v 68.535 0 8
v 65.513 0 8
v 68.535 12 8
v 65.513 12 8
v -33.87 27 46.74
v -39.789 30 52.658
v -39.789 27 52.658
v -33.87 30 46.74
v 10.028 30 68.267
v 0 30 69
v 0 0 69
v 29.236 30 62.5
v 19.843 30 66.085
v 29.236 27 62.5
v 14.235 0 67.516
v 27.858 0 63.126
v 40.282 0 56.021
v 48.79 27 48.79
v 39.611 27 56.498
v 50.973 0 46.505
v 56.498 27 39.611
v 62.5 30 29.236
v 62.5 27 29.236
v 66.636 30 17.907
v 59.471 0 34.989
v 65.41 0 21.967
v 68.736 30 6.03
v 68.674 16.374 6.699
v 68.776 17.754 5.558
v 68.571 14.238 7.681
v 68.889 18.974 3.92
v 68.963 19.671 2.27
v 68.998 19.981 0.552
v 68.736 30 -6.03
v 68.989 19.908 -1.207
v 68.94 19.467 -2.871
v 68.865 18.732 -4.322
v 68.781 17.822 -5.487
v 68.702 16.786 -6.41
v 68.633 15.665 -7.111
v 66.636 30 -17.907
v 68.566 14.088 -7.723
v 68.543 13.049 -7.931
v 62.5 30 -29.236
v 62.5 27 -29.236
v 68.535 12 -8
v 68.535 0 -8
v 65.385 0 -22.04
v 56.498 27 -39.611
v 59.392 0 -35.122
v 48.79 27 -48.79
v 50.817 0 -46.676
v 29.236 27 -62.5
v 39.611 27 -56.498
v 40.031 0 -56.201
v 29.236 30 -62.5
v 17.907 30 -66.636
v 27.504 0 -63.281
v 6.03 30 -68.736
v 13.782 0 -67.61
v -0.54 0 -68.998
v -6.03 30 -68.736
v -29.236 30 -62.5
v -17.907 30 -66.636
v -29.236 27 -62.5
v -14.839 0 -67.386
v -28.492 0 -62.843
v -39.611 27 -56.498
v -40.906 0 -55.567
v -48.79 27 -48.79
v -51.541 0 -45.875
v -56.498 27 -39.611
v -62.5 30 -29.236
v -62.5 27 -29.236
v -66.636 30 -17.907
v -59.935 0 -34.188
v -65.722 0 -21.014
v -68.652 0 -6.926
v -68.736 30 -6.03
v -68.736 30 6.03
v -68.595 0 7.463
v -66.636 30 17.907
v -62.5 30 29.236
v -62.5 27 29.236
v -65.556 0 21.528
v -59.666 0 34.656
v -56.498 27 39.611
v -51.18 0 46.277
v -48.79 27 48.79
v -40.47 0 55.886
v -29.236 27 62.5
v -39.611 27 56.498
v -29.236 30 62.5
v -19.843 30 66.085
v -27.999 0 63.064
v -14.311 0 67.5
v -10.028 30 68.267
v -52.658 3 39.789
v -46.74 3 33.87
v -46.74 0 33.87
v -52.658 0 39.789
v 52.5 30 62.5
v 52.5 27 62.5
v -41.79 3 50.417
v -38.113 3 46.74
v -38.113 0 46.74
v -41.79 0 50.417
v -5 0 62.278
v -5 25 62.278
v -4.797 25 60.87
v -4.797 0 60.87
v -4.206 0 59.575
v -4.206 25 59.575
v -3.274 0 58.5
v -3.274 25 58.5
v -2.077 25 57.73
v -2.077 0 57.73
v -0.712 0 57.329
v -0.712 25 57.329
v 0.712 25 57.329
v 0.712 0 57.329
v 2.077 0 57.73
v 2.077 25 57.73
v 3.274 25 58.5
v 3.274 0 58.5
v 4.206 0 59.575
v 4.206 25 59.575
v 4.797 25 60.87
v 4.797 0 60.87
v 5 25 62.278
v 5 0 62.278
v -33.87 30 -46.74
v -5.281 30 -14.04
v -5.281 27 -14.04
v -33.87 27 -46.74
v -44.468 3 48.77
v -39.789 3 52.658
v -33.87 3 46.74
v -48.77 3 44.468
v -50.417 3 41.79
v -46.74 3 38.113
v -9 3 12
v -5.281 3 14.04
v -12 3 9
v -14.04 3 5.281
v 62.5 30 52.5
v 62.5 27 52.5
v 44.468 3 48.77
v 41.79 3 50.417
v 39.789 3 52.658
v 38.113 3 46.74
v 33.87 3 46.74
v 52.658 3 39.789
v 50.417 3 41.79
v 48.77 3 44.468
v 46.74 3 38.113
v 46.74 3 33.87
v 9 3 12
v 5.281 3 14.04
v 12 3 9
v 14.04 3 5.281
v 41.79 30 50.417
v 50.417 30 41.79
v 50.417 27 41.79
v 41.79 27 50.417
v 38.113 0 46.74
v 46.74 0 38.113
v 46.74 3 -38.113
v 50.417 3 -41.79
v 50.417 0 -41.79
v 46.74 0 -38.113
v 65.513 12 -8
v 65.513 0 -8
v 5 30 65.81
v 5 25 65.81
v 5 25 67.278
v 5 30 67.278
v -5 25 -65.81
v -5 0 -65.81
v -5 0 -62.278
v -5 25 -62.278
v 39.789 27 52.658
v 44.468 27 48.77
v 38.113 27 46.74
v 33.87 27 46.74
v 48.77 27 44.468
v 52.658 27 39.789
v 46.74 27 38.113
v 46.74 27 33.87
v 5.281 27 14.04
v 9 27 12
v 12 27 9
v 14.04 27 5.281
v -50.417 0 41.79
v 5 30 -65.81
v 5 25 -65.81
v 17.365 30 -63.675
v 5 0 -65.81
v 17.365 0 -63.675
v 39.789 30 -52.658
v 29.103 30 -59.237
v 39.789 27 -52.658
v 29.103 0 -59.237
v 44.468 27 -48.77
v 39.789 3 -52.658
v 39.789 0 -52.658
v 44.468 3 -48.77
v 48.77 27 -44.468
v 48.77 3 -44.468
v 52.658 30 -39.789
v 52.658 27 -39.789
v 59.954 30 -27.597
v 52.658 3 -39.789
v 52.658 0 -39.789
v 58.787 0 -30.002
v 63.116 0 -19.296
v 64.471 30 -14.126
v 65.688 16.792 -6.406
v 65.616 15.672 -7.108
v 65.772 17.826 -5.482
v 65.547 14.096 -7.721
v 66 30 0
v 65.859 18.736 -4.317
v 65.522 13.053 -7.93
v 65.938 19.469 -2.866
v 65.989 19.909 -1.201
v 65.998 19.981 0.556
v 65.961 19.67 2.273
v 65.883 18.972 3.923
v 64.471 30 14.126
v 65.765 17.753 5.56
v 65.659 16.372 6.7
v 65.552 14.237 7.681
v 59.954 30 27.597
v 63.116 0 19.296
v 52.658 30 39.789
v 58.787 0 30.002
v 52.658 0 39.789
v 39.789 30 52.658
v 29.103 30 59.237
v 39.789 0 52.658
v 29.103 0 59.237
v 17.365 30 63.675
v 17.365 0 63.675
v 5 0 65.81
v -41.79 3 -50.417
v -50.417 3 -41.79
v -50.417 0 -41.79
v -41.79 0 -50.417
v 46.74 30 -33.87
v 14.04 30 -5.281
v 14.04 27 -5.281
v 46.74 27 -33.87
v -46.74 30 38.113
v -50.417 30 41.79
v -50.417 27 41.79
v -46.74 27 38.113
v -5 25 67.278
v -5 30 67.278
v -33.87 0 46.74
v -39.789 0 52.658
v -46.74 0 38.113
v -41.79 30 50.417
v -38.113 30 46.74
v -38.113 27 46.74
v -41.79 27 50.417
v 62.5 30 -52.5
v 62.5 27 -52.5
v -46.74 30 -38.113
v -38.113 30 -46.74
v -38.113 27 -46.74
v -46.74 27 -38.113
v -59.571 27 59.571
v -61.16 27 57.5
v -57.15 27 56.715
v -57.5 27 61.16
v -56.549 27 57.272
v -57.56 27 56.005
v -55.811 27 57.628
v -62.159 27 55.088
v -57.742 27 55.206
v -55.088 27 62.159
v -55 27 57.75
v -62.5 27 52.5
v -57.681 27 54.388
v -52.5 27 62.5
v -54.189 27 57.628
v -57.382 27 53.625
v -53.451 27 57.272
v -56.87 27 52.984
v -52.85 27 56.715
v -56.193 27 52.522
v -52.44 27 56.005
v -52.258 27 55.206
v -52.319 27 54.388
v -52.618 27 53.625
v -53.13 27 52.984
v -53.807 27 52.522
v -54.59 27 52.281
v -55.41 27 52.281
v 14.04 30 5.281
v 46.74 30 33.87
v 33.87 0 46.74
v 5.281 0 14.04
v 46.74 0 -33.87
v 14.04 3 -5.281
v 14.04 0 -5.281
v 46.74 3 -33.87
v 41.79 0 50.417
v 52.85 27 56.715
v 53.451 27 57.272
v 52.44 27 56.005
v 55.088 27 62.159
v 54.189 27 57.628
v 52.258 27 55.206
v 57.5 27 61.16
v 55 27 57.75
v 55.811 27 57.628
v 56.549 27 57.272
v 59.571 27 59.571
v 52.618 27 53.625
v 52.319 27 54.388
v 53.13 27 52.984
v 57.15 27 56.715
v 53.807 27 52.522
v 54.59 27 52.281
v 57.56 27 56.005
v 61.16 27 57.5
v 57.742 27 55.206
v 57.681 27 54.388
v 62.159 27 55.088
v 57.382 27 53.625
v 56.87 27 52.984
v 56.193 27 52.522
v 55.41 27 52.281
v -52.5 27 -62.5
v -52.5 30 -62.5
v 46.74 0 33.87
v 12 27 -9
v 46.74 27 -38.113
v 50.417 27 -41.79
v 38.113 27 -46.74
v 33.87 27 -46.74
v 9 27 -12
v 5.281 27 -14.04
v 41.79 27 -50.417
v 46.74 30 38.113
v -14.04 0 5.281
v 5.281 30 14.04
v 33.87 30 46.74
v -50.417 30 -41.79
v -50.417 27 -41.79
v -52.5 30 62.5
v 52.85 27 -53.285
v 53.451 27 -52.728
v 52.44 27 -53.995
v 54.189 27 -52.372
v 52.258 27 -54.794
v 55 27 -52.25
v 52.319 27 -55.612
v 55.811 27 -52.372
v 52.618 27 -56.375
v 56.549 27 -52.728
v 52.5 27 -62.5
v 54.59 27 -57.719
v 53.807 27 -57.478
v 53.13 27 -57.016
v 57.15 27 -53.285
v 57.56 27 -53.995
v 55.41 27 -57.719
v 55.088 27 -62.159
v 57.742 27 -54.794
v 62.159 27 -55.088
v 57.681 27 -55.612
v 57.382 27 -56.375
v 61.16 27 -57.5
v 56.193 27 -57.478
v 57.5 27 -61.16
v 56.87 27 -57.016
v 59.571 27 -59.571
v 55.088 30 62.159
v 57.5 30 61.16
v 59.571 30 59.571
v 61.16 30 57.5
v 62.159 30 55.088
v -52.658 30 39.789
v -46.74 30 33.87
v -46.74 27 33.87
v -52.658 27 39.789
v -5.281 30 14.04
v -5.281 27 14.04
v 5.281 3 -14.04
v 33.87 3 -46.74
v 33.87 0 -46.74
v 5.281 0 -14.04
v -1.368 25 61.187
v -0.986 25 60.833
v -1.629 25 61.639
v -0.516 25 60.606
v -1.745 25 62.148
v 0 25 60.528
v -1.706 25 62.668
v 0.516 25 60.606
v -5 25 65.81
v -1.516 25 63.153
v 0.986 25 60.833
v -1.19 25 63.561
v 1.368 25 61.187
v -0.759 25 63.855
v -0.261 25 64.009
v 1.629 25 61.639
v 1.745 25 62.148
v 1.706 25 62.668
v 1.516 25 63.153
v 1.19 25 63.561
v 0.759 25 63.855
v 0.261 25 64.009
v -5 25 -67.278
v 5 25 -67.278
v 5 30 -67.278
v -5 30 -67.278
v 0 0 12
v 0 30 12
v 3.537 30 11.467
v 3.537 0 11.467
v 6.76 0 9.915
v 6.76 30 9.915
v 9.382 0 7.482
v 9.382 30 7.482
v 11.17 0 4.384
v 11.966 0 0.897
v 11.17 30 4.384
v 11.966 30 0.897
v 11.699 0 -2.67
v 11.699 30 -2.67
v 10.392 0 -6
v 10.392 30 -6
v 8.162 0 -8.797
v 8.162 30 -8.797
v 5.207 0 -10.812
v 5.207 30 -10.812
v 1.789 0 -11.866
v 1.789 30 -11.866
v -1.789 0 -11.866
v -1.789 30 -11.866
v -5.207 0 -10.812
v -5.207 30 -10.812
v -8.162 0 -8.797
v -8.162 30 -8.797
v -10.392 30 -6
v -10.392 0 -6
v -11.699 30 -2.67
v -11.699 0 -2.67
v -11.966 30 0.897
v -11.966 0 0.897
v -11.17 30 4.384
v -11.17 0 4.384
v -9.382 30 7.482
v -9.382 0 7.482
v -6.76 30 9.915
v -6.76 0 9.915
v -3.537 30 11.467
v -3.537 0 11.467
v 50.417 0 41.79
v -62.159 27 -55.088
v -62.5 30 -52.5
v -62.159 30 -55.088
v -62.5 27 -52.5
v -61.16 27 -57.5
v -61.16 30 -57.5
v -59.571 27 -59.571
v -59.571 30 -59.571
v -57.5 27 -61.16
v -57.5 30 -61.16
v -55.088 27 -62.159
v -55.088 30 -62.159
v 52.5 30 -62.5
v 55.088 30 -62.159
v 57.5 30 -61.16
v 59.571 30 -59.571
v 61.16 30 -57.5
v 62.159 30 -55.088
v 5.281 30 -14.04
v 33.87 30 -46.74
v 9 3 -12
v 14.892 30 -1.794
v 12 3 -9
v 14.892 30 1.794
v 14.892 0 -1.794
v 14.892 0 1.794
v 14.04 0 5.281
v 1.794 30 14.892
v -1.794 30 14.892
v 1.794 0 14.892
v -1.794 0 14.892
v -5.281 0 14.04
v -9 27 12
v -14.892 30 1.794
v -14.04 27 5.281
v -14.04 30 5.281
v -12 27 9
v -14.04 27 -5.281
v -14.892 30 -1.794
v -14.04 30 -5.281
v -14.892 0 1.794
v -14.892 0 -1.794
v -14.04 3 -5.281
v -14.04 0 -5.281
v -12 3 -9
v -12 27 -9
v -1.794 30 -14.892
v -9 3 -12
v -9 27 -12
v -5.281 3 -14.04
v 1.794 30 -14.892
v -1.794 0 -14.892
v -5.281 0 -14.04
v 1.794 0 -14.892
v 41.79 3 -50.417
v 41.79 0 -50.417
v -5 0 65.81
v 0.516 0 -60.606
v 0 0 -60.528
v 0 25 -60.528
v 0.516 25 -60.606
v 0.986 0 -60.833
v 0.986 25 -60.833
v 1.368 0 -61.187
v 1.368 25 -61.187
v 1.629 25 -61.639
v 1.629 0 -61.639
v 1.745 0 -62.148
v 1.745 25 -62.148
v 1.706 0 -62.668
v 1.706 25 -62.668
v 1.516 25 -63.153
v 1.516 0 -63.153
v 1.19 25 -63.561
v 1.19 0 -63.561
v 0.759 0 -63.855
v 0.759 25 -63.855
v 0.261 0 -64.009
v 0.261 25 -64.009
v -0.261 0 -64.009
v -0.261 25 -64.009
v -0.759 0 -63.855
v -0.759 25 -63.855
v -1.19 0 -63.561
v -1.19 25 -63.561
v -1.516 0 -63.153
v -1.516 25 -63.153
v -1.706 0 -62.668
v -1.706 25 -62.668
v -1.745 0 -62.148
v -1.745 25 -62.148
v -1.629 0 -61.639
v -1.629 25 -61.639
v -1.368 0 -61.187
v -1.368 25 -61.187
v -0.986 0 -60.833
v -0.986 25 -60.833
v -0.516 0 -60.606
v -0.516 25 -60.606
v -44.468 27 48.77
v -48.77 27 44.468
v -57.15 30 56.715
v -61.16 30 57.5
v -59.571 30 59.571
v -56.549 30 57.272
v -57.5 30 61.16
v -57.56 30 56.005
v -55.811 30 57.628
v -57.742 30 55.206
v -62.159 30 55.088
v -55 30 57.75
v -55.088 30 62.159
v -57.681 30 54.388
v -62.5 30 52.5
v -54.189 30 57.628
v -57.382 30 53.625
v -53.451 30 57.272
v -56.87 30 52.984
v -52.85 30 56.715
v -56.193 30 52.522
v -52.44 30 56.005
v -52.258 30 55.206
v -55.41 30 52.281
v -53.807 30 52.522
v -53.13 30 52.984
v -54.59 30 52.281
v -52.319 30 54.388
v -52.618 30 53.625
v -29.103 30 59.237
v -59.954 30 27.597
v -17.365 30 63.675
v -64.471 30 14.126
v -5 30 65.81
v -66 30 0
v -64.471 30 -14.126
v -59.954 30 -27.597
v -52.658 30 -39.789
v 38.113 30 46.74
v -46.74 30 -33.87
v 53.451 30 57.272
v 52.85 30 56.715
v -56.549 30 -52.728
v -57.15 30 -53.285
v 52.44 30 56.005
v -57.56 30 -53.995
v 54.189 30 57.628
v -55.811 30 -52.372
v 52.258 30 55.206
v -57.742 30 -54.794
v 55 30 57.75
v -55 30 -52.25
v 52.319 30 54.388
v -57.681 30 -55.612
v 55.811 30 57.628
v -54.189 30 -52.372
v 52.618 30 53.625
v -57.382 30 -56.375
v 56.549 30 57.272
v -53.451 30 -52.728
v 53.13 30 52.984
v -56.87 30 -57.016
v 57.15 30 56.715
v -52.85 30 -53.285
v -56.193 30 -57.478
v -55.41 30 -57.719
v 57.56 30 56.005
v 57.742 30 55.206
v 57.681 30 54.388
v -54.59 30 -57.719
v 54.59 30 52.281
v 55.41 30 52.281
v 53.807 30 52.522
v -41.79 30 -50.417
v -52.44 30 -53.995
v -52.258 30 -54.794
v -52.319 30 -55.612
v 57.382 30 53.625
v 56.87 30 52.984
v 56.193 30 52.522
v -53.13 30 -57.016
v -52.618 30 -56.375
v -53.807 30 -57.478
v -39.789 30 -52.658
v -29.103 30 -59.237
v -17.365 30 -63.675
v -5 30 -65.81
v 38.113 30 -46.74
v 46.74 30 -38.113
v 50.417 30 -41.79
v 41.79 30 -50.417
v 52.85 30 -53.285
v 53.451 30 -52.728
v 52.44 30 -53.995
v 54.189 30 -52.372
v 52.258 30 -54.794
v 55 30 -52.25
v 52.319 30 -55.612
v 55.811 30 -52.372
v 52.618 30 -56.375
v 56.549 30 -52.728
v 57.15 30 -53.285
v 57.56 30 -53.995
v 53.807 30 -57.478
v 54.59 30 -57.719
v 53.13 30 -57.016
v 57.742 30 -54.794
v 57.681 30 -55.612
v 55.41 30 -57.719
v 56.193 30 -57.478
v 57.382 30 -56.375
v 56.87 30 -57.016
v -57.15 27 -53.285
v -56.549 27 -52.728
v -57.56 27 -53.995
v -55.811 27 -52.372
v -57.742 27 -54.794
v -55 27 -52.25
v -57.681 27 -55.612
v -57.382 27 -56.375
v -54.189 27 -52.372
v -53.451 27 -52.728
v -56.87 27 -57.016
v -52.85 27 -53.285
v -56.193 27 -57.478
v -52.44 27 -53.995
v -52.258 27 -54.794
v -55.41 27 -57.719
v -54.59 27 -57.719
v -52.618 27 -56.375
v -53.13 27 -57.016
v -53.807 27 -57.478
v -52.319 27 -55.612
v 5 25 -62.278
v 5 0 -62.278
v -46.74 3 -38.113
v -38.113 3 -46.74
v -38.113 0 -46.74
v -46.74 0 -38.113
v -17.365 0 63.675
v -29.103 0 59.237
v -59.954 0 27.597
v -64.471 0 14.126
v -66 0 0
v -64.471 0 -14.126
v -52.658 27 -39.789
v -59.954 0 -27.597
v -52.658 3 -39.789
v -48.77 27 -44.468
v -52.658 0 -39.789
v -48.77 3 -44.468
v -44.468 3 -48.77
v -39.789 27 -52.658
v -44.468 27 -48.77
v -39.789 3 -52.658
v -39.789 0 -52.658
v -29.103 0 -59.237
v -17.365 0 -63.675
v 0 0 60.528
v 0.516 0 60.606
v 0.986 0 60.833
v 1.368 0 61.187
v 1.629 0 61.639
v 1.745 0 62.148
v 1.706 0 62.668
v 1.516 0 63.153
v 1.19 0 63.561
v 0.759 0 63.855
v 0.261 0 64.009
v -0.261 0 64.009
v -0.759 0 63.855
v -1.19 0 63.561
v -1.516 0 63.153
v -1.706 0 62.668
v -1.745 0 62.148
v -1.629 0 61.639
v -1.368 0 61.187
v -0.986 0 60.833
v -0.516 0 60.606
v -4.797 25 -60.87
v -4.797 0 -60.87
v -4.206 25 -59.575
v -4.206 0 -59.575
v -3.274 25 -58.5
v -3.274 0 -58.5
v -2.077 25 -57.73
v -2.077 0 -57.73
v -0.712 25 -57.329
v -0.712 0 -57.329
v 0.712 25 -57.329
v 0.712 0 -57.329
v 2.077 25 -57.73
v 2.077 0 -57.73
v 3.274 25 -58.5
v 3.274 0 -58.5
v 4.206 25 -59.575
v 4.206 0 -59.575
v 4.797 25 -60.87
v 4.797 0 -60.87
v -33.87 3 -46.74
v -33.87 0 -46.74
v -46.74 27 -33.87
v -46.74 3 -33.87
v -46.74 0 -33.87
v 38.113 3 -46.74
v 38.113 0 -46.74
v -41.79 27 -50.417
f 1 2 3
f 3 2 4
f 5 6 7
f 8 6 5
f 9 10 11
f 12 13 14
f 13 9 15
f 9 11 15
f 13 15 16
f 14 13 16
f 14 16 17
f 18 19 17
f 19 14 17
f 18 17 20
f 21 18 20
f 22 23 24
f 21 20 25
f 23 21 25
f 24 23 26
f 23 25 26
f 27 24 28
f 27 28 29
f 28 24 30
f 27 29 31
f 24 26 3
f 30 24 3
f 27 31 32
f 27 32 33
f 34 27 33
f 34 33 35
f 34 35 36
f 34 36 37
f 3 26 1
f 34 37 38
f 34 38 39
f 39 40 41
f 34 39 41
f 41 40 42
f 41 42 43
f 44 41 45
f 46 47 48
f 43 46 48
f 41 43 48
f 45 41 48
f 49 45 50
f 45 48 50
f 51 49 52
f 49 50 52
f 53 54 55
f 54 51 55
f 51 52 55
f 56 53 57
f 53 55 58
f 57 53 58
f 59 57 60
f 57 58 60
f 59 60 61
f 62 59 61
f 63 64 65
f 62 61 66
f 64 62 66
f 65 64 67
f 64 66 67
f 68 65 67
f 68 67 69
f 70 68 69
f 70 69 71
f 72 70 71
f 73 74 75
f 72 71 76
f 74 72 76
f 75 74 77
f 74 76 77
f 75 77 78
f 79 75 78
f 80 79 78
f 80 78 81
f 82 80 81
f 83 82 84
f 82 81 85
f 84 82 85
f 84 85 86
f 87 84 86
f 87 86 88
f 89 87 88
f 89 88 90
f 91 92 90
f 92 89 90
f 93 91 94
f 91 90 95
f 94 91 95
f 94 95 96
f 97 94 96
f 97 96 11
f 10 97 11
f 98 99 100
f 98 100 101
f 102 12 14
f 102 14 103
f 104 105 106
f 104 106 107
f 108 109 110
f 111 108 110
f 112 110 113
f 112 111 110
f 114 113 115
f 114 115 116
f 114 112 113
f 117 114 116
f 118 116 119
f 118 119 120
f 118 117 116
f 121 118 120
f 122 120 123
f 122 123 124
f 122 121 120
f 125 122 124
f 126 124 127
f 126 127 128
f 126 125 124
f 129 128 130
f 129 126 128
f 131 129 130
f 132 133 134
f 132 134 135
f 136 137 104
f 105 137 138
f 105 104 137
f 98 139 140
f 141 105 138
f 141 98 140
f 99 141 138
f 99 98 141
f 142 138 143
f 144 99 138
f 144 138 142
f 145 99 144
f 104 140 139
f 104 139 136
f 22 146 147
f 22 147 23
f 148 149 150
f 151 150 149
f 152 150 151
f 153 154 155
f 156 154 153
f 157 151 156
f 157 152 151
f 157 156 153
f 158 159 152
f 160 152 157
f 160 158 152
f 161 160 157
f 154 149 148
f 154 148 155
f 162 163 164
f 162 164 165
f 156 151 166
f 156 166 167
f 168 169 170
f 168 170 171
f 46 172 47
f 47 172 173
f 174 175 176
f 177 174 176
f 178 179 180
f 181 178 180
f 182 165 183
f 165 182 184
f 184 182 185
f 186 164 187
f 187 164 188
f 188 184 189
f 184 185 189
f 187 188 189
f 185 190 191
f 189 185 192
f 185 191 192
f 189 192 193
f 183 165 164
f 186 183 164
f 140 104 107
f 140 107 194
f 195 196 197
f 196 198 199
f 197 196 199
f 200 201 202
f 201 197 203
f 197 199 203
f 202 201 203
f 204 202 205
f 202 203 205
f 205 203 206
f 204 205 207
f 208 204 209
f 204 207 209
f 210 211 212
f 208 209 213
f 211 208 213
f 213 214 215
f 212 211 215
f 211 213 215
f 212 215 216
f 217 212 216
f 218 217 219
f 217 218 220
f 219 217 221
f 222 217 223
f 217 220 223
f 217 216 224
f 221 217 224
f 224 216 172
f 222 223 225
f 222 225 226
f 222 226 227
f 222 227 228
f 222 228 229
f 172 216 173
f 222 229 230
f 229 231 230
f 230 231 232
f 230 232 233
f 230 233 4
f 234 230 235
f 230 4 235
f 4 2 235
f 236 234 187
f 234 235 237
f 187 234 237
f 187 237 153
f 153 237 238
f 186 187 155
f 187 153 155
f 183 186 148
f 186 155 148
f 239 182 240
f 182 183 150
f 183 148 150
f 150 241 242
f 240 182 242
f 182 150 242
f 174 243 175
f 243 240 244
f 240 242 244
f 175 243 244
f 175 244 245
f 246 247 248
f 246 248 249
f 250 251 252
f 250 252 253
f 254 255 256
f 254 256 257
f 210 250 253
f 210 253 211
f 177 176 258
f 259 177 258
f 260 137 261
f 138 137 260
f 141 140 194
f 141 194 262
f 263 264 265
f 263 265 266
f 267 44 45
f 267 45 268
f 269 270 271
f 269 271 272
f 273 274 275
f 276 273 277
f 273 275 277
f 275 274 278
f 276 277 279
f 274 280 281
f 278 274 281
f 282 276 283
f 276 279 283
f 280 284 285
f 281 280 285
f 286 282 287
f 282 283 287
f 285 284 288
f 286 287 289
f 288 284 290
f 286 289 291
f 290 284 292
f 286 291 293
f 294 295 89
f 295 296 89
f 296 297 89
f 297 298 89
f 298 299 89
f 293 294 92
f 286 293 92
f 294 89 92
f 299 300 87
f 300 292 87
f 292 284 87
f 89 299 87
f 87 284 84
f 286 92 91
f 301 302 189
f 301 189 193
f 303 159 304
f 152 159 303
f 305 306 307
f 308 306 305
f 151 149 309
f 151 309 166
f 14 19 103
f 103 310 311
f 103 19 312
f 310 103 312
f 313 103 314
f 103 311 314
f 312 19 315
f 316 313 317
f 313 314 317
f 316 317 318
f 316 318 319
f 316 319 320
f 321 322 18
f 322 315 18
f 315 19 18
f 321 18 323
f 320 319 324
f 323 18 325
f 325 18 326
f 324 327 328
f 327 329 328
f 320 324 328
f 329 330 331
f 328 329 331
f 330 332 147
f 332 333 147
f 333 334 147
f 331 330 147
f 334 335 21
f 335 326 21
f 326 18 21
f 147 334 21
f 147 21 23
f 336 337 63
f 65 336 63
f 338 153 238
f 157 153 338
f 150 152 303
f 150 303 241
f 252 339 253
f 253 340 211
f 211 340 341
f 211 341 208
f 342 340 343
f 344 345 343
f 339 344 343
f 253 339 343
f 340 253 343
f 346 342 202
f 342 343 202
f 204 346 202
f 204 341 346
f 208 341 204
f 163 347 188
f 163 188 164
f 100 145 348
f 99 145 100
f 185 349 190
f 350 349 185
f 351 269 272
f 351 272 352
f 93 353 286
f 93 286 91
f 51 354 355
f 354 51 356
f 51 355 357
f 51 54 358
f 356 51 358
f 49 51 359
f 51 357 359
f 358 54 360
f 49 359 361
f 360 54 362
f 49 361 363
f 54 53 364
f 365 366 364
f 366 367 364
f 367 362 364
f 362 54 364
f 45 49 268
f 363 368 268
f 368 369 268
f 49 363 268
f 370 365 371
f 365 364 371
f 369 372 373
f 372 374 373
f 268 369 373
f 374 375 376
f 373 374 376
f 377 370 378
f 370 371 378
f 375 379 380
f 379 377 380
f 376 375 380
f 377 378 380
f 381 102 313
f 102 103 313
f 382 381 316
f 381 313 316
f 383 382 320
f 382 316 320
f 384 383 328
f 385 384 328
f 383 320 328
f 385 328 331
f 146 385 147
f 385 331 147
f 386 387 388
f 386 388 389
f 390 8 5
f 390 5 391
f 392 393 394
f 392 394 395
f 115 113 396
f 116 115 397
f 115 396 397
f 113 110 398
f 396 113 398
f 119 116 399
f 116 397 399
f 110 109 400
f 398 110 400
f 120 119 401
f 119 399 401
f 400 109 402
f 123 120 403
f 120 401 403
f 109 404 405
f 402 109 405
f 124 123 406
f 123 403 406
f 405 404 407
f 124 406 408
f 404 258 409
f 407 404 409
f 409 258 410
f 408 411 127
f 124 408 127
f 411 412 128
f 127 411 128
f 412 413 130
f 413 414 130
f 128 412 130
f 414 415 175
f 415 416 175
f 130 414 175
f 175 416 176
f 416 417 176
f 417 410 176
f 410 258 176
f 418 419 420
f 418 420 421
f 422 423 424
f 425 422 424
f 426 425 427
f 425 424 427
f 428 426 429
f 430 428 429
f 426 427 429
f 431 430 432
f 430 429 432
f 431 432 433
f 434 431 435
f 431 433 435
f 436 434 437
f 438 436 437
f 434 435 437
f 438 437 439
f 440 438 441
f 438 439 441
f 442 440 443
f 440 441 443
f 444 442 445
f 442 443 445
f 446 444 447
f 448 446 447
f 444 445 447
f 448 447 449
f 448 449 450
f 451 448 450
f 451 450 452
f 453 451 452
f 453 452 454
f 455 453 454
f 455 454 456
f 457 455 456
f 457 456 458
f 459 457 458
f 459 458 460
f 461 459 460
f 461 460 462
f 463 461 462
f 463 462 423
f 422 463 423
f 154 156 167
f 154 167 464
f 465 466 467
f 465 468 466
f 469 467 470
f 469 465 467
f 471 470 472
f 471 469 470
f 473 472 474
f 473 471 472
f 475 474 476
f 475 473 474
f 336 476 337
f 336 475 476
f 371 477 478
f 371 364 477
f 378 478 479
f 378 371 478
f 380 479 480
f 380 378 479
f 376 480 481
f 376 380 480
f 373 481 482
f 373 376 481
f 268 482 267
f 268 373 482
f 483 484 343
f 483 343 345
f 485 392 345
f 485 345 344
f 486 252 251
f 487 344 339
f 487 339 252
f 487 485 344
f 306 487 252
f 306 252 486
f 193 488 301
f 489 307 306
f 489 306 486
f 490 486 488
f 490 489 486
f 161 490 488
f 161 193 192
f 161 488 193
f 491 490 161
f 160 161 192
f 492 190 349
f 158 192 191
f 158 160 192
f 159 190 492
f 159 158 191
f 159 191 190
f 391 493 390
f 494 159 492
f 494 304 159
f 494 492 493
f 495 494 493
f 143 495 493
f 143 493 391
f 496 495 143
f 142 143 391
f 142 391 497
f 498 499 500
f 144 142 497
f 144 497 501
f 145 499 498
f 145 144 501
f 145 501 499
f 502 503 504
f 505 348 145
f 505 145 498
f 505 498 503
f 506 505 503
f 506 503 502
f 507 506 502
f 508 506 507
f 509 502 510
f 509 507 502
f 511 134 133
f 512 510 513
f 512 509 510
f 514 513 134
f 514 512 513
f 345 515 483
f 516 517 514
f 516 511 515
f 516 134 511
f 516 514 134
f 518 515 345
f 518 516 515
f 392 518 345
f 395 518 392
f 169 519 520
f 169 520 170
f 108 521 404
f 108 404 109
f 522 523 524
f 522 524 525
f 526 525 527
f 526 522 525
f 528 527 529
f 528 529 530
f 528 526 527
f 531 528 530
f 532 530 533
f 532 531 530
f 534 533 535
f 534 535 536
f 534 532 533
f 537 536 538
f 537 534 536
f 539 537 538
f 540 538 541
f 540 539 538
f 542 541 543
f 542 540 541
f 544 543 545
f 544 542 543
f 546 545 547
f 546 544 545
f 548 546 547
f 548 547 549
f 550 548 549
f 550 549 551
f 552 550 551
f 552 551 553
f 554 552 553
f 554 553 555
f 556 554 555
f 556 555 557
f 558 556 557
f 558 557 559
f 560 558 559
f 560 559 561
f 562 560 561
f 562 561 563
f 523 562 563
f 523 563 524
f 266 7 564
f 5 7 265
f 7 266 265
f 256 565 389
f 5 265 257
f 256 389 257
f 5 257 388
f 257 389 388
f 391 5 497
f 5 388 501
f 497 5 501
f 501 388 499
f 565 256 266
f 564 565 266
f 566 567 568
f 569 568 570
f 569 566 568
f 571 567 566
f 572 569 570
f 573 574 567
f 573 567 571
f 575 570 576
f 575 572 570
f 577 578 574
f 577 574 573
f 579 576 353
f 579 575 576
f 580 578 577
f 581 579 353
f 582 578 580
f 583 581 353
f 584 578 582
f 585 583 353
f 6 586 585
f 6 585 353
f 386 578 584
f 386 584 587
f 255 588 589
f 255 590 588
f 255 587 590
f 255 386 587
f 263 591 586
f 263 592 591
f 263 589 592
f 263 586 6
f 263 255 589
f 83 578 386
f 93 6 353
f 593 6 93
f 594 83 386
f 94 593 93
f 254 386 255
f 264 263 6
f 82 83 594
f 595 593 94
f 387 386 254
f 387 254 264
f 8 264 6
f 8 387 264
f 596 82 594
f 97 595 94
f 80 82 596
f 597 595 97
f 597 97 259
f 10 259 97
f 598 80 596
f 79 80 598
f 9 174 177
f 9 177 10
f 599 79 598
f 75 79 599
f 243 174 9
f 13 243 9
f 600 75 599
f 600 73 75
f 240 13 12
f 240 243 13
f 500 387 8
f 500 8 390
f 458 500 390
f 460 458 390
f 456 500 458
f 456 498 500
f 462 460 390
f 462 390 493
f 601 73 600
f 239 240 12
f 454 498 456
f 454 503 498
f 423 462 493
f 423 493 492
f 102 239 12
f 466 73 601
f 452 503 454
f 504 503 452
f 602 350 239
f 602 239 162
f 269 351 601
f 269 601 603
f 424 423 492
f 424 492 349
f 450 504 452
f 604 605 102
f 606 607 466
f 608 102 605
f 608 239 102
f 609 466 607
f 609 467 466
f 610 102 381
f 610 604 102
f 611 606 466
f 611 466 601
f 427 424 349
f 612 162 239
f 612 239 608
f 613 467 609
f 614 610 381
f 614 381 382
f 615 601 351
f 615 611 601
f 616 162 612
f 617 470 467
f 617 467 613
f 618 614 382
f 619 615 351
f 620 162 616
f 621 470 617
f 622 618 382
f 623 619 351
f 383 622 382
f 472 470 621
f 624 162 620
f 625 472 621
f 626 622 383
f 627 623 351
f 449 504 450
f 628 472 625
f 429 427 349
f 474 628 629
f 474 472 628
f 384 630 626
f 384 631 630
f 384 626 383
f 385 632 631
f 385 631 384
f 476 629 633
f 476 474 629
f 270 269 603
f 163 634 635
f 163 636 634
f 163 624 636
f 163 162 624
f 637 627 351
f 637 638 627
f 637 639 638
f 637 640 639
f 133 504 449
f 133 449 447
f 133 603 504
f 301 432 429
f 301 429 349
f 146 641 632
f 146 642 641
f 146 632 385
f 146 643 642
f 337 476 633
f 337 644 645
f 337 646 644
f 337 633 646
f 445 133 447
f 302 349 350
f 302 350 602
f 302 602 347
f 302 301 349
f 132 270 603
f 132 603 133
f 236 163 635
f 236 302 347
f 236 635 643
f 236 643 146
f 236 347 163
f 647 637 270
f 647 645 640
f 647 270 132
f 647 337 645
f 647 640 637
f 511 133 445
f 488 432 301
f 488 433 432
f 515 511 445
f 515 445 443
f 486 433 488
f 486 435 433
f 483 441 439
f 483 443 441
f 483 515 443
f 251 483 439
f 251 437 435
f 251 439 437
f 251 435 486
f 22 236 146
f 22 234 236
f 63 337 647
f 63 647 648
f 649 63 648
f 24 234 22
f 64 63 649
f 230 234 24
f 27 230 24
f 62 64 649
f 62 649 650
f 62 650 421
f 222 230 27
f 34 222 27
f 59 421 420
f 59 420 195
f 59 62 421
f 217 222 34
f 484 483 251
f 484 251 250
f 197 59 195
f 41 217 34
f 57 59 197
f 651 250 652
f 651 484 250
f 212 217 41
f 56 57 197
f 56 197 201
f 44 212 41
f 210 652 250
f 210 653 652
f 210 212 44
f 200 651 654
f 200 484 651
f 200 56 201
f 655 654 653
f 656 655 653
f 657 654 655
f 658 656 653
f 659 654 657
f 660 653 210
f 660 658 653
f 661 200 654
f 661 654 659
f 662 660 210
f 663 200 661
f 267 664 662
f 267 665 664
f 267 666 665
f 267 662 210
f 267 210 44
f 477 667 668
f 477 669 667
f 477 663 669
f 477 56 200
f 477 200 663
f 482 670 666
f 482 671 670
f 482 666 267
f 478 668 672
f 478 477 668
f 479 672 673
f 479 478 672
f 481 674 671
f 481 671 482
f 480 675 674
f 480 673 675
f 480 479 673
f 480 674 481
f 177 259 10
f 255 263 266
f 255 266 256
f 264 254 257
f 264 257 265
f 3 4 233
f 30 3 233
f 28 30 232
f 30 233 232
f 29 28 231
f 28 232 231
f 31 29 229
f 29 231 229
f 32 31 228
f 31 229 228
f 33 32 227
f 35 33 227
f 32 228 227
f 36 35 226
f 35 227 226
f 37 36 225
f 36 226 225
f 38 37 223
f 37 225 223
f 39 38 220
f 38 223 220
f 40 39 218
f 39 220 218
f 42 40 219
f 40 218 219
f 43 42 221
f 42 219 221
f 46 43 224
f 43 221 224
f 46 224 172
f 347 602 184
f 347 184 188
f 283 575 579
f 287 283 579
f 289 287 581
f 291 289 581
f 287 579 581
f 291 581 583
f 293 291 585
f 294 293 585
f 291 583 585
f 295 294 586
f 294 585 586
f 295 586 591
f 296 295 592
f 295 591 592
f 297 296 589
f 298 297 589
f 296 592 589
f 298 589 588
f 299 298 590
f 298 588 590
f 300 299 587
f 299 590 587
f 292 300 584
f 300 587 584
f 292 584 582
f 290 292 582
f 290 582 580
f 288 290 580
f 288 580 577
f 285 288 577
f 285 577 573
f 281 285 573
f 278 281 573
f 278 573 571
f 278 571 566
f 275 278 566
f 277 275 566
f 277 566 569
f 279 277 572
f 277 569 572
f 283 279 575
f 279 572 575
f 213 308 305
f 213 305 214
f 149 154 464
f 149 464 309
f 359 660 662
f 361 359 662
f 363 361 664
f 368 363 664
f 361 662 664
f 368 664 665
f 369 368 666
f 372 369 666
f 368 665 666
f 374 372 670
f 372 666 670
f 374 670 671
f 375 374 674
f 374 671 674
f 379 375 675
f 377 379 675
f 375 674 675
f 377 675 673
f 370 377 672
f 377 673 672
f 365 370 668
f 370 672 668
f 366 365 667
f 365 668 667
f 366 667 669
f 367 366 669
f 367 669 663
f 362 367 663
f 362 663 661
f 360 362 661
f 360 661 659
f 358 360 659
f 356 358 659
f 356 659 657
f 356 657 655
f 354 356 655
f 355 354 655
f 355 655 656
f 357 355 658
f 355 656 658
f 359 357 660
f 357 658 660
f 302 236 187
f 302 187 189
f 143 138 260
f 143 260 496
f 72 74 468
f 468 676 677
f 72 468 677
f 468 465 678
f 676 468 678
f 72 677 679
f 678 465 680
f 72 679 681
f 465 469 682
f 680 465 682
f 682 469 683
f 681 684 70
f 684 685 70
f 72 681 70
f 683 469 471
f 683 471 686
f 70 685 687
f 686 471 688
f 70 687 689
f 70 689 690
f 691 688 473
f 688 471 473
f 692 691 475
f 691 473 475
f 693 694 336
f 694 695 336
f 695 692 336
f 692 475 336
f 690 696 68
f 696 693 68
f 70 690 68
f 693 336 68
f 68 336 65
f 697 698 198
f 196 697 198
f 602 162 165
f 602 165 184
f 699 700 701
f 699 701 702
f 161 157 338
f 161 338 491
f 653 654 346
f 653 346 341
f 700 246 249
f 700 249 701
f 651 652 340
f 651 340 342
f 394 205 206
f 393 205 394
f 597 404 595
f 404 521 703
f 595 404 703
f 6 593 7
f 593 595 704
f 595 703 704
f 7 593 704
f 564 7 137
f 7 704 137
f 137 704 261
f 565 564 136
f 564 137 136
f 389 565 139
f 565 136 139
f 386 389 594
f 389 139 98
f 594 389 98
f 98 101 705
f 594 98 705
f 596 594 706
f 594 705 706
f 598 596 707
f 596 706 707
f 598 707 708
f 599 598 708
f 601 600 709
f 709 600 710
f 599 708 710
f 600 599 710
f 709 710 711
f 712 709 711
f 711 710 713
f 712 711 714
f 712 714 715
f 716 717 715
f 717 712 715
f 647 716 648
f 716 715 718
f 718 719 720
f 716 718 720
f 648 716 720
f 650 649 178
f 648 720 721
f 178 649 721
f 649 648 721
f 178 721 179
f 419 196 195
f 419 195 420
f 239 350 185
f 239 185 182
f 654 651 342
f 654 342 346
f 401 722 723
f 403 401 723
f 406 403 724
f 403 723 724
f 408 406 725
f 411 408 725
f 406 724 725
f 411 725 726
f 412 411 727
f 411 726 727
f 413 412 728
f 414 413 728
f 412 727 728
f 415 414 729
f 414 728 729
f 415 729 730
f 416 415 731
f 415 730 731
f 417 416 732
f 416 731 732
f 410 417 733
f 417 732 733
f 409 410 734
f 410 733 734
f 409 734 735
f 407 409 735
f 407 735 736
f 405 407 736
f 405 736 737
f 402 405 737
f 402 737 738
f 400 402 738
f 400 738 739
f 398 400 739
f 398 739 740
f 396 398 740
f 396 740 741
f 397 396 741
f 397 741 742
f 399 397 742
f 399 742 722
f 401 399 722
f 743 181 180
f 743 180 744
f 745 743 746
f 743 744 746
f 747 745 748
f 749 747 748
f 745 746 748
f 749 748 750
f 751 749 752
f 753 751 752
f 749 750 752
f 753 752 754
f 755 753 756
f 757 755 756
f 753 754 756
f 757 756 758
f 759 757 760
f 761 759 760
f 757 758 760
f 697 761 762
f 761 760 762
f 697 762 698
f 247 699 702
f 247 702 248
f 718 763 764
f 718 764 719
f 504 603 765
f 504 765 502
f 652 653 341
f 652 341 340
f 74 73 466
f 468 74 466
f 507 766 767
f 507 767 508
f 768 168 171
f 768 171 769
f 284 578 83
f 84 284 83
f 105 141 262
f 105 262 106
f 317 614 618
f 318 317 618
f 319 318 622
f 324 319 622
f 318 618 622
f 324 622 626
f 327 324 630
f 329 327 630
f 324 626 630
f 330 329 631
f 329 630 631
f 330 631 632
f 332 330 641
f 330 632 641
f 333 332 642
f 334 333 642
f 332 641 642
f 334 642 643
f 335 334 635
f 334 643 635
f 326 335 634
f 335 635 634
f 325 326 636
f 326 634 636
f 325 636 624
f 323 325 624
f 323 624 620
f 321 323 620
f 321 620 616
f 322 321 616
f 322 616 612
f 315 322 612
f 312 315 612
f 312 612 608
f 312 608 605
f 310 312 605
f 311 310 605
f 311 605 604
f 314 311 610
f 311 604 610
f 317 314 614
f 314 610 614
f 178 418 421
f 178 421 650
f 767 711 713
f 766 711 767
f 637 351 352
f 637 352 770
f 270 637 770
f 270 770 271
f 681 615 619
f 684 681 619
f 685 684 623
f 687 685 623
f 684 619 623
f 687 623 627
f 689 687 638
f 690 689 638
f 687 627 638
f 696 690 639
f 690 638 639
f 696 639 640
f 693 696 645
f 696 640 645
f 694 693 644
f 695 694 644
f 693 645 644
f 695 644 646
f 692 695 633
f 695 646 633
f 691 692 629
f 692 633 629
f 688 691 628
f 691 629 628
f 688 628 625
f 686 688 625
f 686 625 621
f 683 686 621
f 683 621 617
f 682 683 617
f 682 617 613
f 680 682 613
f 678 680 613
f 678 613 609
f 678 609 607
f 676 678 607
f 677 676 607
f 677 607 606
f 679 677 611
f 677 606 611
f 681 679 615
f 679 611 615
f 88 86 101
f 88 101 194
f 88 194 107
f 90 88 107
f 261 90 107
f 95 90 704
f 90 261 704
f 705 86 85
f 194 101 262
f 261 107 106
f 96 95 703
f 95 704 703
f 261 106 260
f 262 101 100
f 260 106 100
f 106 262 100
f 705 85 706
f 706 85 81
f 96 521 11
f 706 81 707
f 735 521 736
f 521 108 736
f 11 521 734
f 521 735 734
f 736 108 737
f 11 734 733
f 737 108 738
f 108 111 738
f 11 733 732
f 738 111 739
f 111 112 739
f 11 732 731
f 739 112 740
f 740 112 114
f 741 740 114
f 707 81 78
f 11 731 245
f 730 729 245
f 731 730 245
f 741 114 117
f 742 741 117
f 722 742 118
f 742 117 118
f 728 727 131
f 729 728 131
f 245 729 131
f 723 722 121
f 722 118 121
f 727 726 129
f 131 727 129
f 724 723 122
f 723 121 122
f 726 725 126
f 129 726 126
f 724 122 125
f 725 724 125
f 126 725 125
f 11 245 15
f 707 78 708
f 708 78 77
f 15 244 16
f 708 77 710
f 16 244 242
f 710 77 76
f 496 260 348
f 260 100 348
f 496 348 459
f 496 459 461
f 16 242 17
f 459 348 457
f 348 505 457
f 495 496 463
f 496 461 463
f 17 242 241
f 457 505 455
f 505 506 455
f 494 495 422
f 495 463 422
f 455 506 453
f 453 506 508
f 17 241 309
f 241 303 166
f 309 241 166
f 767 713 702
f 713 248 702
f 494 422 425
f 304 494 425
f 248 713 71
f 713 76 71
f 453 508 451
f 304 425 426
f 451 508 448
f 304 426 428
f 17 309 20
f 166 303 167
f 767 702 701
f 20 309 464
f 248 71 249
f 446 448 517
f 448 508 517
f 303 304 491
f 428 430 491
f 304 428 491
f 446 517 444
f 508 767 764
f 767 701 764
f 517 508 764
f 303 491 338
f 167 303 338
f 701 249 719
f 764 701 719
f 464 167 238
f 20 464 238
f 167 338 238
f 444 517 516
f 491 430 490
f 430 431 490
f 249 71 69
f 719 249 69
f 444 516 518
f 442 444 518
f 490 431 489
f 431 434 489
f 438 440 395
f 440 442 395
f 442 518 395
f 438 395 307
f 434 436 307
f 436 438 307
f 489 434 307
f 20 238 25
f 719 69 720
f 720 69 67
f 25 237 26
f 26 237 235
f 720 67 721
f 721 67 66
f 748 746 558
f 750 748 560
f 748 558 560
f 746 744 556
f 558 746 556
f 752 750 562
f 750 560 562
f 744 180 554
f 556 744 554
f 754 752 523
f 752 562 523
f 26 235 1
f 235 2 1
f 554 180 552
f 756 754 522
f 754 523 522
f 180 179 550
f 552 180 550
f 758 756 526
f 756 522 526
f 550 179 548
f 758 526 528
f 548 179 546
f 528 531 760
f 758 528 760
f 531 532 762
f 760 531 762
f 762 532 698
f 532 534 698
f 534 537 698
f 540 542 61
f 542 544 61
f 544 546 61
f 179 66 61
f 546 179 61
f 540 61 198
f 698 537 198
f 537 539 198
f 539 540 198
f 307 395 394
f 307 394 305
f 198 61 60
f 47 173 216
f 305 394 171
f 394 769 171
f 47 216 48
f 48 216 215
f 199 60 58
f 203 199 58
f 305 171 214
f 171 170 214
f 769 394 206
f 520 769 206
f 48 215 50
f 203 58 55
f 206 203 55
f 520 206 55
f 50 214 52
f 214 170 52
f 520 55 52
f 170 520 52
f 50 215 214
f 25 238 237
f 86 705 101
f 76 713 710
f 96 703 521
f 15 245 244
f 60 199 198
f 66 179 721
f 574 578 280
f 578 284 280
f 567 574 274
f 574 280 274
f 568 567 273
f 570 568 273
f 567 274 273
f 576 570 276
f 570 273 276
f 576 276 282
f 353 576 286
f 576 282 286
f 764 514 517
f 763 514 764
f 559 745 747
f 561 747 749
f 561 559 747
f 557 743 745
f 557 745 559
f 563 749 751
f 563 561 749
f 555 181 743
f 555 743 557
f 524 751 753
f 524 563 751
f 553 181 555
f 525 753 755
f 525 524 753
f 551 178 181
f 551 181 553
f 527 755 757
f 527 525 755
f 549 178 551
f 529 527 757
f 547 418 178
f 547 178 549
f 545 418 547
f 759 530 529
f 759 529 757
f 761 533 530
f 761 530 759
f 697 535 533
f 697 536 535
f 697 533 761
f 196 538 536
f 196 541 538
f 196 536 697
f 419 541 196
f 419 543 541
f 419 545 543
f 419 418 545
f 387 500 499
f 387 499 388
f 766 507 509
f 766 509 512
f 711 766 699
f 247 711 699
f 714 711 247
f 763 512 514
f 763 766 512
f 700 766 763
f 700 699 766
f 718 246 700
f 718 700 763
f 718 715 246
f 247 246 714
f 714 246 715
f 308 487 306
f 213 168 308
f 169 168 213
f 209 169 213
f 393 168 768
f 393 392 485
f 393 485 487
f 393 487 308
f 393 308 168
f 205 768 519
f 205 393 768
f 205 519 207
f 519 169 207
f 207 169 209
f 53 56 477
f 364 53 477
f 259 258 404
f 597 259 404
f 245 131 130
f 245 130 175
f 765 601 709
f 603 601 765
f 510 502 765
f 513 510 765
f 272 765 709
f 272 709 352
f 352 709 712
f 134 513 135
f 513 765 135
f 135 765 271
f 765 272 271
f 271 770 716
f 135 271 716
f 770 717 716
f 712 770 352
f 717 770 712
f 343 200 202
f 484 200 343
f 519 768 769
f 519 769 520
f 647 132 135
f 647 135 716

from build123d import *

# Parameters (mm, degrees)
SKETCH1_R               = 69
BOSS_EXTRUDE1_DEPTH     = 30
SKETCH2_W               = 125
SKETCH2_H               = 125
BOSS_EXTRUDE2_DEPTH     = 3
SKETCH3_R               = 2.75
CUT_EXTRUDE1_DEPTH      = 3
SKETCH4_R               = 66
CUT_EXTRUDE2_DEPTH      = 103.088197163
FILLET1_R               = 10
CUT_EXTRUDE3_DEPTH      = 103.088197163
BOSS_EXTRUDE4_DEPTH     = 30
CIRPATTERN2_COUNT       = 4
BOSS_EXTRUDE5_DEPTH     = 30
CUT_EXTRUDE4_DEPTH      = 12
CUT_EXTRUDE4_DEPTH_BACK = 12
SKETCH10_R              = 66
SKETCH11_R              = 15
BOSS_EXTRUDE6_DEPTH     = 30
SKETCH12_R              = 1.75
BOSS_EXTRUDE9_DEPTH     = 30
CUT_EXTRUDE5_START      = -25
SKETCH12_3_R            = 1.75
CUT_EXTRUDE5_DEPTH      = 5
SKETCH14_R              = 12
CUT_EXTRUDE6_DEPTH      = 103.088197329


with BuildPart() as part:
    # Sketch1 → Boss-Extrude1 (new body)
    with BuildSketch(Plane(origin=(0, 0, 0), x_dir=(1, 0, 0), z_dir=(0, 1, 0))):
        with Locations(Location((0, 0, 0), (0, 0, 270))):
            Circle(SKETCH1_R)
    extrude(amount=BOSS_EXTRUDE1_DEPTH)

    # Sketch2 → Boss-Extrude2 (add)
    with BuildSketch(Plane(origin=(0, 30, 0), x_dir=(1, 0, 0), z_dir=(0, 1, 0))):
        Rectangle(SKETCH2_W, SKETCH2_H)
    extrude(amount=-BOSS_EXTRUDE2_DEPTH)

    # Sketch3 → Cut-Extrude1 (cut)
    with BuildSketch(Plane(origin=(0, 30, 0), x_dir=(1, 0, 0), z_dir=(0, 1, 0))):
        with Locations(Location((55, 55, 0), (0, 0, 270))):
            Circle(SKETCH3_R)
        with Locations(Location((-55, 55, 0), (0, 0, 270))):
            Circle(SKETCH3_R)
        with Locations(Location((-55, -55, 0), (0, 0, 270))):
            Circle(SKETCH3_R)
        with Locations(Location((55, -55, 0), (0, 0, 270))):
            Circle(SKETCH3_R)
    extrude(amount=-CUT_EXTRUDE1_DEPTH, mode=Mode.SUBTRACT)

    # Sketch4 → Cut-Extrude2 (cut, through all)
    with BuildSketch(Plane.XZ):
        with Locations(Location((0, 0, 0), (0, 0, 270))):
            Circle(SKETCH4_R)
    extrude(amount=-CUT_EXTRUDE2_DEPTH, mode=Mode.SUBTRACT)

    # Fillet1
    fillet1_edges = [part.edges().sort_by_distance(p)[0] for p in [
        (-62.5, 28.5, 62.5),
        (-62.5, 28.5, -62.5),
        (62.5, 28.5, -62.5),
        (62.5, 28.5, 62.5),
    ]]
    fillet(fillet1_edges, radius=FILLET1_R)

    # Sketch6 → Cut-Extrude3 (cut, through all)
    with BuildSketch(Plane(origin=(0, 0, 0), x_dir=(0, 0, -1), z_dir=(1, 0, 0))):
        with BuildLine():
            Line((-8, 0), (-8, 12))
            ThreePointArc((-8, 12), (0, 20), (8, 12))
            Line((8, 12), (8, 0))
            ThreePointArc((8, 0), (0, -8), (-8, 0))
        make_face()
    extrude(amount=CUT_EXTRUDE3_DEPTH, mode=Mode.SUBTRACT)

    # Sketch8 → Boss-Extrude4 (add)
    with BuildSketch(Plane(origin=(0, 30, 0), x_dir=(1, 0, 0), z_dir=(0, 1, 0))):
        Polygon((41.790010768, 54.659354186), (33.870414819, 46.739758236), (46.739758236, 33.870414819), (54.659354186, 41.790010768), align=None)
        Polygon((41.790010768, 50.416713499), (50.416713499, 41.790010768), (46.739758236, 38.113055506), (38.113055506, 46.739758236), align=None, mode=Mode.SUBTRACT)
    boss_extrude4 = extrude(amount=-BOSS_EXTRUDE4_DEPTH)

    # CirPattern2: Boss-Extrude4 ×4 about axis
    cirpattern2_axis = Axis((0, 0, 0), (0, 1, 0))
    for i in range(1, CIRPATTERN2_COUNT):
        add(boss_extrude4.rotate(cirpattern2_axis, i * 360 / CIRPATTERN2_COUNT))

    # Sketch9 → Boss-Extrude5 (add)
    with BuildSketch(Plane(origin=(0, 30, 0), x_dir=(1, 0, 0), z_dir=(0, 1, 0))):
        Polygon((46.739758236, 33.870414819), (33.870414819, 46.739758236), (0, 8), (-33.870414819, 46.739758236), (-46.739758236, 33.870414819), (-8, 0), (-46.739758236, -33.870414819), (-33.870414819, -46.739758236), (0, -8), (33.870414819, -46.739758236), (46.739758236, -33.870414819), (8, 0), align=None)
    extrude(amount=-BOSS_EXTRUDE5_DEPTH)

    # Sketch10 → Cut-Extrude4 (cut, two sides: drawn at the far end of the back side and taken through both)
    with BuildSketch(Plane(origin=(0, 15, 0), x_dir=(1, 0, 0), z_dir=(0, 1, 0)).offset(-CUT_EXTRUDE4_DEPTH_BACK)):
        with Locations(Location((0, 0, 0), (0, 0, 52.925119379))):
            Circle(SKETCH10_R)
    extrude(amount=CUT_EXTRUDE4_DEPTH + CUT_EXTRUDE4_DEPTH_BACK, mode=Mode.SUBTRACT)

    # Sketch11 → Boss-Extrude6 (add)
    with BuildSketch(Plane.XZ):
        with Locations(Location((0, 0, 0), (0, 0, 290.612180744))):
            Circle(SKETCH11_R)
    extrude(amount=-BOSS_EXTRUDE6_DEPTH)

    # Sketch12 → Boss-Extrude9 (add)
    with BuildSketch(Plane.XZ):
        with BuildLine():
            Line((5, 62.278453748), (5, 67.278453748))
            Line((5, 67.278453748), (-5, 67.278453748))
            Line((-5, 67.278453748), (-5, 62.278453748))
            ThreePointArc((-5, 62.278453748), (0, 57.278453748), (5, 62.278453748))
        make_face()
        with Locations(Location((0, 62.278453748, 0), (0, 0, 270))):
            Circle(SKETCH12_R, mode=Mode.SUBTRACT)
    boss_extrude9 = extrude(amount=-BOSS_EXTRUDE9_DEPTH)

    # Mirror1: Boss-Extrude9 across plane
    add(boss_extrude9.mirror(Plane.XY))

    # Sketch12<3> → Cut-Extrude5 (cut)
    with BuildSketch(Plane.XZ.offset(CUT_EXTRUDE5_START)):
        with BuildLine():
            Line((5, 62.278453748), (5, 67.278453748))
            Line((5, 67.278453748), (-5, 67.278453748))
            Line((-5, 67.278453748), (-5, 62.278453748))
            ThreePointArc((-5, 62.278453748), (0, 57.278453748), (5, 62.278453748))
        make_face()
        with Locations(Location((0, 62.278453748, 0), (0, 0, 270))):
            Circle(SKETCH12_3_R, mode=Mode.SUBTRACT)
    cut_extrude5 = extrude(amount=-CUT_EXTRUDE5_DEPTH, mode=Mode.SUBTRACT)

    # Mirror2: Cut-Extrude5 across plane
    add(cut_extrude5.mirror(Plane.XY), mode=Mode.SUBTRACT)

    # Sketch14 → Cut-Extrude6 (cut, through all)
    with BuildSketch(Plane(origin=(0, 30, 0), x_dir=(1, 0, 0), z_dir=(0, 1, 0))):
        with Locations(Location((0, 0, 0), (0, 0, 270))):
            Circle(SKETCH14_R)
    extrude(amount=-CUT_EXTRUDE6_DEPTH, mode=Mode.SUBTRACT)


solid = part.part
